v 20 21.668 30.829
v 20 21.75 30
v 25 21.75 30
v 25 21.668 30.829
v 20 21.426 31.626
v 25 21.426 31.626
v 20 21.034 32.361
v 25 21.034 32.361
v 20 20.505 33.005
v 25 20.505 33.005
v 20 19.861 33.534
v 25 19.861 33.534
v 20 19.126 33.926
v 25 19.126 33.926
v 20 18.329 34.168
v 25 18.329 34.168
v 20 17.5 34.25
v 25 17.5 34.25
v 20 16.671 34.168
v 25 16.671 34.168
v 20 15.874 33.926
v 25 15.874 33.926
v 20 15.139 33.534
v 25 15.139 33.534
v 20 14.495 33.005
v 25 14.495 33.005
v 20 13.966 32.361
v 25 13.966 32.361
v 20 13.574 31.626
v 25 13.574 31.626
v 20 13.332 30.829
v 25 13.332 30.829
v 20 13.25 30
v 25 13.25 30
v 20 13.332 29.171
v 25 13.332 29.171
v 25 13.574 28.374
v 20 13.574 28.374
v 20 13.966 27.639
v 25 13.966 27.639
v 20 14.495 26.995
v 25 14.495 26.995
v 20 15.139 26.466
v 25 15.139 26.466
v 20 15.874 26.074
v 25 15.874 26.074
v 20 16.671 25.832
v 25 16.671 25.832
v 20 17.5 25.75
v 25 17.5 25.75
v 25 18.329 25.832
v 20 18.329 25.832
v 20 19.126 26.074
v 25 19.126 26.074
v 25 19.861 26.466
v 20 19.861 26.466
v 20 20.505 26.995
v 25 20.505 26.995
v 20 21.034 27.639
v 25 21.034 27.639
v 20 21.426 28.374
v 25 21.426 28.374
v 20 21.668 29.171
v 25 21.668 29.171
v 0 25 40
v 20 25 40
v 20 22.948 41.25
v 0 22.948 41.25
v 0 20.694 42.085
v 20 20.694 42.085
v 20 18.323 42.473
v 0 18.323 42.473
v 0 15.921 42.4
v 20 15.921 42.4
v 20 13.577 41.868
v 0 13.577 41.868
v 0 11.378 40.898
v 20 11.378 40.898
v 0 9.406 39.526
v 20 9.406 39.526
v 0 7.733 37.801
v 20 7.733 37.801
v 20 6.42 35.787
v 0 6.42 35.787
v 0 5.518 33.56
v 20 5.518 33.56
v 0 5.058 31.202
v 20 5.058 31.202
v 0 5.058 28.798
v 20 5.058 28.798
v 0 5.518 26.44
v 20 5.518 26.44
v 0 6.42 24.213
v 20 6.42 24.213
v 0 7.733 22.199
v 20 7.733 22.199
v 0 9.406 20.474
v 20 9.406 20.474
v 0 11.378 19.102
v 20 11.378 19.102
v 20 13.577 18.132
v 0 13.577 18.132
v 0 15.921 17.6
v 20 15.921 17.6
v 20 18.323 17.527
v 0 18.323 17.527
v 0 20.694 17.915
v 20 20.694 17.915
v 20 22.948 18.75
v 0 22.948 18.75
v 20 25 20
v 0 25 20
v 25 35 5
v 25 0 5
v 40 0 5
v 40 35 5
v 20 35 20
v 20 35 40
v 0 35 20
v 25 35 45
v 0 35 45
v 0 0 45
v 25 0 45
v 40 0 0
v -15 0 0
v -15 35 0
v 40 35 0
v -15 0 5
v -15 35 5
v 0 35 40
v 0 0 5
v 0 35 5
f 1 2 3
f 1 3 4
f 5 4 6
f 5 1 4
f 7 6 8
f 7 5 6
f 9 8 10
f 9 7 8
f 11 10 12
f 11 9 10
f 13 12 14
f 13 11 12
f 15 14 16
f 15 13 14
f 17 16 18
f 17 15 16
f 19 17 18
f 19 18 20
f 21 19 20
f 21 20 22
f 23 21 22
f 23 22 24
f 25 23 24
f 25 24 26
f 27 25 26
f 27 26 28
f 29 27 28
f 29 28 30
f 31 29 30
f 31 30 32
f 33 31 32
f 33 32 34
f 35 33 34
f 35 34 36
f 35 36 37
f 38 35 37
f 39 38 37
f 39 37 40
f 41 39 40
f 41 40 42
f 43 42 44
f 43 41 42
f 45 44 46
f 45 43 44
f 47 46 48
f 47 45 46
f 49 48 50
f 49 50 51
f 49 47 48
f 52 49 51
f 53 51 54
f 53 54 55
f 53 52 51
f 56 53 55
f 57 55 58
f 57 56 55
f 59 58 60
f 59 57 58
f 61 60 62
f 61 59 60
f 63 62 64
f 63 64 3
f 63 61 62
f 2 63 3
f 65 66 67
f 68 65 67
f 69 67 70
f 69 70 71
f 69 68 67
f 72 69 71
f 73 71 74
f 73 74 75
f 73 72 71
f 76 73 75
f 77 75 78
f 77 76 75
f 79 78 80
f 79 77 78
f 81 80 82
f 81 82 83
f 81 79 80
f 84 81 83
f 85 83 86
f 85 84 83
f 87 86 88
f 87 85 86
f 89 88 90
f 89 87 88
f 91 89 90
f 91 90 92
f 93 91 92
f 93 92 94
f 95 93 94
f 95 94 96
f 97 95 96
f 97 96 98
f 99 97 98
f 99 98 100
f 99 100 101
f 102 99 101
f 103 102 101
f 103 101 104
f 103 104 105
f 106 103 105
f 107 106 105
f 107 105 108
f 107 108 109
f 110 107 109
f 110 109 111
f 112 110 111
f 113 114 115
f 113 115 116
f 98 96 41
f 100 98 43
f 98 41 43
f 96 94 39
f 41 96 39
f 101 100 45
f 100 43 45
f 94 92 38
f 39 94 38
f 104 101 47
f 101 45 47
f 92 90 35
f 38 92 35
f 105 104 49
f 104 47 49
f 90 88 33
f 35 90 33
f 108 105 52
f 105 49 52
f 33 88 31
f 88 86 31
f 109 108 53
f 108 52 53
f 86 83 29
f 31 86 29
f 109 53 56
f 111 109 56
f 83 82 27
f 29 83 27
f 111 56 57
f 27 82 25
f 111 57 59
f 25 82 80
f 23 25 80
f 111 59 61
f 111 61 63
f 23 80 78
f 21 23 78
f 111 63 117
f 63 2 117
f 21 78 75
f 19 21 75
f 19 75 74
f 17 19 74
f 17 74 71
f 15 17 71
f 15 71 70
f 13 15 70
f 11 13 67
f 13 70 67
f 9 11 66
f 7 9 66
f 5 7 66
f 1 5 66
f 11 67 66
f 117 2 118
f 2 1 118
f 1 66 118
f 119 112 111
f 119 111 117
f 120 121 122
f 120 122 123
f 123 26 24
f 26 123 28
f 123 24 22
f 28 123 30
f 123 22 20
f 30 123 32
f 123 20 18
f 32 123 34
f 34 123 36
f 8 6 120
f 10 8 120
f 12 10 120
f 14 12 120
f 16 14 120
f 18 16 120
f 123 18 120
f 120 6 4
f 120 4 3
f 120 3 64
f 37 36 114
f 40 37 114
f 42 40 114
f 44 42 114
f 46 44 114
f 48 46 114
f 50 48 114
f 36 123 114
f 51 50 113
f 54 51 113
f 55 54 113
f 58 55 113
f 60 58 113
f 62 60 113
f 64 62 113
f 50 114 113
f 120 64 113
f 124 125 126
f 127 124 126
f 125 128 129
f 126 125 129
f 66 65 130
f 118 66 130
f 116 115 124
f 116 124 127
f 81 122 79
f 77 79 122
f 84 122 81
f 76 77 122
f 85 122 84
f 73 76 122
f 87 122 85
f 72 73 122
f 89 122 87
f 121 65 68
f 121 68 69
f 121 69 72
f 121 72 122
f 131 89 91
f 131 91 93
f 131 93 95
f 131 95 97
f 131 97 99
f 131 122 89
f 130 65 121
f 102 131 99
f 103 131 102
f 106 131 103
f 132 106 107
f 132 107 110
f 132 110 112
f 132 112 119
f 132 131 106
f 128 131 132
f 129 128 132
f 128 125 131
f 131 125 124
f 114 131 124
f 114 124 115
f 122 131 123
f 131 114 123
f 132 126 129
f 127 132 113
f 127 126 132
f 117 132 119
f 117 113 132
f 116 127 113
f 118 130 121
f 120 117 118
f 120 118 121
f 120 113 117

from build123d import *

# Parameters (mm, degrees)
F0_W      = 25
F0_H      = 35
F1_DEPTH  = 45
F2_R      = 12.5
F3_DEPTH  = 20
F4_R      = 4.25
F5_DEPTH  = 25
F6_W      = 35
F6_H      = 5
F7_DEPTH  = 15
F8_W      = 35
F8_H      = 5
F9_DEPTH  = 40
F10_W     = 17.5
F10_H     = 20
F11_DEPTH = 20


with BuildPart() as f1:
    # F0 (on Top) → F1 (new body)
    with BuildSketch(Plane.XY):
        with Locations((12.5, 17.5)):
            Rectangle(F0_W, F0_H)
    extrude(amount=F1_DEPTH)

    # F2 (on Right) → F3 (cut)
    with BuildSketch(Plane.YZ):
        with Locations((17.5, 30)):
            Circle(F2_R)
    extrude(amount=F3_DEPTH, mode=Mode.SUBTRACT)

    # F4 (on Right) → F5 (cut)
    with BuildSketch(Plane.YZ):
        with Locations((17.5, 30)):
            Circle(F4_R)
    extrude(amount=F5_DEPTH, mode=Mode.SUBTRACT)

    # F6 (on Right) → F7 (join)
    with BuildSketch(Plane.YZ):
        with Locations((17.5, 2.5)):
            Rectangle(F6_W, F6_H)
    extrude(amount=-F7_DEPTH)

    # F8 (on Right) → F9 (join)
    with BuildSketch(Plane.YZ):
        with Locations((17.5, 2.5)):
            Rectangle(F8_W, F8_H)
    extrude(amount=F9_DEPTH)

    # F10 (on Right) → F11 (cut)
    with BuildSketch(Plane.YZ):
        with Locations((26.25, 30)):
            Rectangle(F10_W, F10_H)
    extrude(amount=F11_DEPTH, mode=Mode.SUBTRACT)


solid = f1.part
